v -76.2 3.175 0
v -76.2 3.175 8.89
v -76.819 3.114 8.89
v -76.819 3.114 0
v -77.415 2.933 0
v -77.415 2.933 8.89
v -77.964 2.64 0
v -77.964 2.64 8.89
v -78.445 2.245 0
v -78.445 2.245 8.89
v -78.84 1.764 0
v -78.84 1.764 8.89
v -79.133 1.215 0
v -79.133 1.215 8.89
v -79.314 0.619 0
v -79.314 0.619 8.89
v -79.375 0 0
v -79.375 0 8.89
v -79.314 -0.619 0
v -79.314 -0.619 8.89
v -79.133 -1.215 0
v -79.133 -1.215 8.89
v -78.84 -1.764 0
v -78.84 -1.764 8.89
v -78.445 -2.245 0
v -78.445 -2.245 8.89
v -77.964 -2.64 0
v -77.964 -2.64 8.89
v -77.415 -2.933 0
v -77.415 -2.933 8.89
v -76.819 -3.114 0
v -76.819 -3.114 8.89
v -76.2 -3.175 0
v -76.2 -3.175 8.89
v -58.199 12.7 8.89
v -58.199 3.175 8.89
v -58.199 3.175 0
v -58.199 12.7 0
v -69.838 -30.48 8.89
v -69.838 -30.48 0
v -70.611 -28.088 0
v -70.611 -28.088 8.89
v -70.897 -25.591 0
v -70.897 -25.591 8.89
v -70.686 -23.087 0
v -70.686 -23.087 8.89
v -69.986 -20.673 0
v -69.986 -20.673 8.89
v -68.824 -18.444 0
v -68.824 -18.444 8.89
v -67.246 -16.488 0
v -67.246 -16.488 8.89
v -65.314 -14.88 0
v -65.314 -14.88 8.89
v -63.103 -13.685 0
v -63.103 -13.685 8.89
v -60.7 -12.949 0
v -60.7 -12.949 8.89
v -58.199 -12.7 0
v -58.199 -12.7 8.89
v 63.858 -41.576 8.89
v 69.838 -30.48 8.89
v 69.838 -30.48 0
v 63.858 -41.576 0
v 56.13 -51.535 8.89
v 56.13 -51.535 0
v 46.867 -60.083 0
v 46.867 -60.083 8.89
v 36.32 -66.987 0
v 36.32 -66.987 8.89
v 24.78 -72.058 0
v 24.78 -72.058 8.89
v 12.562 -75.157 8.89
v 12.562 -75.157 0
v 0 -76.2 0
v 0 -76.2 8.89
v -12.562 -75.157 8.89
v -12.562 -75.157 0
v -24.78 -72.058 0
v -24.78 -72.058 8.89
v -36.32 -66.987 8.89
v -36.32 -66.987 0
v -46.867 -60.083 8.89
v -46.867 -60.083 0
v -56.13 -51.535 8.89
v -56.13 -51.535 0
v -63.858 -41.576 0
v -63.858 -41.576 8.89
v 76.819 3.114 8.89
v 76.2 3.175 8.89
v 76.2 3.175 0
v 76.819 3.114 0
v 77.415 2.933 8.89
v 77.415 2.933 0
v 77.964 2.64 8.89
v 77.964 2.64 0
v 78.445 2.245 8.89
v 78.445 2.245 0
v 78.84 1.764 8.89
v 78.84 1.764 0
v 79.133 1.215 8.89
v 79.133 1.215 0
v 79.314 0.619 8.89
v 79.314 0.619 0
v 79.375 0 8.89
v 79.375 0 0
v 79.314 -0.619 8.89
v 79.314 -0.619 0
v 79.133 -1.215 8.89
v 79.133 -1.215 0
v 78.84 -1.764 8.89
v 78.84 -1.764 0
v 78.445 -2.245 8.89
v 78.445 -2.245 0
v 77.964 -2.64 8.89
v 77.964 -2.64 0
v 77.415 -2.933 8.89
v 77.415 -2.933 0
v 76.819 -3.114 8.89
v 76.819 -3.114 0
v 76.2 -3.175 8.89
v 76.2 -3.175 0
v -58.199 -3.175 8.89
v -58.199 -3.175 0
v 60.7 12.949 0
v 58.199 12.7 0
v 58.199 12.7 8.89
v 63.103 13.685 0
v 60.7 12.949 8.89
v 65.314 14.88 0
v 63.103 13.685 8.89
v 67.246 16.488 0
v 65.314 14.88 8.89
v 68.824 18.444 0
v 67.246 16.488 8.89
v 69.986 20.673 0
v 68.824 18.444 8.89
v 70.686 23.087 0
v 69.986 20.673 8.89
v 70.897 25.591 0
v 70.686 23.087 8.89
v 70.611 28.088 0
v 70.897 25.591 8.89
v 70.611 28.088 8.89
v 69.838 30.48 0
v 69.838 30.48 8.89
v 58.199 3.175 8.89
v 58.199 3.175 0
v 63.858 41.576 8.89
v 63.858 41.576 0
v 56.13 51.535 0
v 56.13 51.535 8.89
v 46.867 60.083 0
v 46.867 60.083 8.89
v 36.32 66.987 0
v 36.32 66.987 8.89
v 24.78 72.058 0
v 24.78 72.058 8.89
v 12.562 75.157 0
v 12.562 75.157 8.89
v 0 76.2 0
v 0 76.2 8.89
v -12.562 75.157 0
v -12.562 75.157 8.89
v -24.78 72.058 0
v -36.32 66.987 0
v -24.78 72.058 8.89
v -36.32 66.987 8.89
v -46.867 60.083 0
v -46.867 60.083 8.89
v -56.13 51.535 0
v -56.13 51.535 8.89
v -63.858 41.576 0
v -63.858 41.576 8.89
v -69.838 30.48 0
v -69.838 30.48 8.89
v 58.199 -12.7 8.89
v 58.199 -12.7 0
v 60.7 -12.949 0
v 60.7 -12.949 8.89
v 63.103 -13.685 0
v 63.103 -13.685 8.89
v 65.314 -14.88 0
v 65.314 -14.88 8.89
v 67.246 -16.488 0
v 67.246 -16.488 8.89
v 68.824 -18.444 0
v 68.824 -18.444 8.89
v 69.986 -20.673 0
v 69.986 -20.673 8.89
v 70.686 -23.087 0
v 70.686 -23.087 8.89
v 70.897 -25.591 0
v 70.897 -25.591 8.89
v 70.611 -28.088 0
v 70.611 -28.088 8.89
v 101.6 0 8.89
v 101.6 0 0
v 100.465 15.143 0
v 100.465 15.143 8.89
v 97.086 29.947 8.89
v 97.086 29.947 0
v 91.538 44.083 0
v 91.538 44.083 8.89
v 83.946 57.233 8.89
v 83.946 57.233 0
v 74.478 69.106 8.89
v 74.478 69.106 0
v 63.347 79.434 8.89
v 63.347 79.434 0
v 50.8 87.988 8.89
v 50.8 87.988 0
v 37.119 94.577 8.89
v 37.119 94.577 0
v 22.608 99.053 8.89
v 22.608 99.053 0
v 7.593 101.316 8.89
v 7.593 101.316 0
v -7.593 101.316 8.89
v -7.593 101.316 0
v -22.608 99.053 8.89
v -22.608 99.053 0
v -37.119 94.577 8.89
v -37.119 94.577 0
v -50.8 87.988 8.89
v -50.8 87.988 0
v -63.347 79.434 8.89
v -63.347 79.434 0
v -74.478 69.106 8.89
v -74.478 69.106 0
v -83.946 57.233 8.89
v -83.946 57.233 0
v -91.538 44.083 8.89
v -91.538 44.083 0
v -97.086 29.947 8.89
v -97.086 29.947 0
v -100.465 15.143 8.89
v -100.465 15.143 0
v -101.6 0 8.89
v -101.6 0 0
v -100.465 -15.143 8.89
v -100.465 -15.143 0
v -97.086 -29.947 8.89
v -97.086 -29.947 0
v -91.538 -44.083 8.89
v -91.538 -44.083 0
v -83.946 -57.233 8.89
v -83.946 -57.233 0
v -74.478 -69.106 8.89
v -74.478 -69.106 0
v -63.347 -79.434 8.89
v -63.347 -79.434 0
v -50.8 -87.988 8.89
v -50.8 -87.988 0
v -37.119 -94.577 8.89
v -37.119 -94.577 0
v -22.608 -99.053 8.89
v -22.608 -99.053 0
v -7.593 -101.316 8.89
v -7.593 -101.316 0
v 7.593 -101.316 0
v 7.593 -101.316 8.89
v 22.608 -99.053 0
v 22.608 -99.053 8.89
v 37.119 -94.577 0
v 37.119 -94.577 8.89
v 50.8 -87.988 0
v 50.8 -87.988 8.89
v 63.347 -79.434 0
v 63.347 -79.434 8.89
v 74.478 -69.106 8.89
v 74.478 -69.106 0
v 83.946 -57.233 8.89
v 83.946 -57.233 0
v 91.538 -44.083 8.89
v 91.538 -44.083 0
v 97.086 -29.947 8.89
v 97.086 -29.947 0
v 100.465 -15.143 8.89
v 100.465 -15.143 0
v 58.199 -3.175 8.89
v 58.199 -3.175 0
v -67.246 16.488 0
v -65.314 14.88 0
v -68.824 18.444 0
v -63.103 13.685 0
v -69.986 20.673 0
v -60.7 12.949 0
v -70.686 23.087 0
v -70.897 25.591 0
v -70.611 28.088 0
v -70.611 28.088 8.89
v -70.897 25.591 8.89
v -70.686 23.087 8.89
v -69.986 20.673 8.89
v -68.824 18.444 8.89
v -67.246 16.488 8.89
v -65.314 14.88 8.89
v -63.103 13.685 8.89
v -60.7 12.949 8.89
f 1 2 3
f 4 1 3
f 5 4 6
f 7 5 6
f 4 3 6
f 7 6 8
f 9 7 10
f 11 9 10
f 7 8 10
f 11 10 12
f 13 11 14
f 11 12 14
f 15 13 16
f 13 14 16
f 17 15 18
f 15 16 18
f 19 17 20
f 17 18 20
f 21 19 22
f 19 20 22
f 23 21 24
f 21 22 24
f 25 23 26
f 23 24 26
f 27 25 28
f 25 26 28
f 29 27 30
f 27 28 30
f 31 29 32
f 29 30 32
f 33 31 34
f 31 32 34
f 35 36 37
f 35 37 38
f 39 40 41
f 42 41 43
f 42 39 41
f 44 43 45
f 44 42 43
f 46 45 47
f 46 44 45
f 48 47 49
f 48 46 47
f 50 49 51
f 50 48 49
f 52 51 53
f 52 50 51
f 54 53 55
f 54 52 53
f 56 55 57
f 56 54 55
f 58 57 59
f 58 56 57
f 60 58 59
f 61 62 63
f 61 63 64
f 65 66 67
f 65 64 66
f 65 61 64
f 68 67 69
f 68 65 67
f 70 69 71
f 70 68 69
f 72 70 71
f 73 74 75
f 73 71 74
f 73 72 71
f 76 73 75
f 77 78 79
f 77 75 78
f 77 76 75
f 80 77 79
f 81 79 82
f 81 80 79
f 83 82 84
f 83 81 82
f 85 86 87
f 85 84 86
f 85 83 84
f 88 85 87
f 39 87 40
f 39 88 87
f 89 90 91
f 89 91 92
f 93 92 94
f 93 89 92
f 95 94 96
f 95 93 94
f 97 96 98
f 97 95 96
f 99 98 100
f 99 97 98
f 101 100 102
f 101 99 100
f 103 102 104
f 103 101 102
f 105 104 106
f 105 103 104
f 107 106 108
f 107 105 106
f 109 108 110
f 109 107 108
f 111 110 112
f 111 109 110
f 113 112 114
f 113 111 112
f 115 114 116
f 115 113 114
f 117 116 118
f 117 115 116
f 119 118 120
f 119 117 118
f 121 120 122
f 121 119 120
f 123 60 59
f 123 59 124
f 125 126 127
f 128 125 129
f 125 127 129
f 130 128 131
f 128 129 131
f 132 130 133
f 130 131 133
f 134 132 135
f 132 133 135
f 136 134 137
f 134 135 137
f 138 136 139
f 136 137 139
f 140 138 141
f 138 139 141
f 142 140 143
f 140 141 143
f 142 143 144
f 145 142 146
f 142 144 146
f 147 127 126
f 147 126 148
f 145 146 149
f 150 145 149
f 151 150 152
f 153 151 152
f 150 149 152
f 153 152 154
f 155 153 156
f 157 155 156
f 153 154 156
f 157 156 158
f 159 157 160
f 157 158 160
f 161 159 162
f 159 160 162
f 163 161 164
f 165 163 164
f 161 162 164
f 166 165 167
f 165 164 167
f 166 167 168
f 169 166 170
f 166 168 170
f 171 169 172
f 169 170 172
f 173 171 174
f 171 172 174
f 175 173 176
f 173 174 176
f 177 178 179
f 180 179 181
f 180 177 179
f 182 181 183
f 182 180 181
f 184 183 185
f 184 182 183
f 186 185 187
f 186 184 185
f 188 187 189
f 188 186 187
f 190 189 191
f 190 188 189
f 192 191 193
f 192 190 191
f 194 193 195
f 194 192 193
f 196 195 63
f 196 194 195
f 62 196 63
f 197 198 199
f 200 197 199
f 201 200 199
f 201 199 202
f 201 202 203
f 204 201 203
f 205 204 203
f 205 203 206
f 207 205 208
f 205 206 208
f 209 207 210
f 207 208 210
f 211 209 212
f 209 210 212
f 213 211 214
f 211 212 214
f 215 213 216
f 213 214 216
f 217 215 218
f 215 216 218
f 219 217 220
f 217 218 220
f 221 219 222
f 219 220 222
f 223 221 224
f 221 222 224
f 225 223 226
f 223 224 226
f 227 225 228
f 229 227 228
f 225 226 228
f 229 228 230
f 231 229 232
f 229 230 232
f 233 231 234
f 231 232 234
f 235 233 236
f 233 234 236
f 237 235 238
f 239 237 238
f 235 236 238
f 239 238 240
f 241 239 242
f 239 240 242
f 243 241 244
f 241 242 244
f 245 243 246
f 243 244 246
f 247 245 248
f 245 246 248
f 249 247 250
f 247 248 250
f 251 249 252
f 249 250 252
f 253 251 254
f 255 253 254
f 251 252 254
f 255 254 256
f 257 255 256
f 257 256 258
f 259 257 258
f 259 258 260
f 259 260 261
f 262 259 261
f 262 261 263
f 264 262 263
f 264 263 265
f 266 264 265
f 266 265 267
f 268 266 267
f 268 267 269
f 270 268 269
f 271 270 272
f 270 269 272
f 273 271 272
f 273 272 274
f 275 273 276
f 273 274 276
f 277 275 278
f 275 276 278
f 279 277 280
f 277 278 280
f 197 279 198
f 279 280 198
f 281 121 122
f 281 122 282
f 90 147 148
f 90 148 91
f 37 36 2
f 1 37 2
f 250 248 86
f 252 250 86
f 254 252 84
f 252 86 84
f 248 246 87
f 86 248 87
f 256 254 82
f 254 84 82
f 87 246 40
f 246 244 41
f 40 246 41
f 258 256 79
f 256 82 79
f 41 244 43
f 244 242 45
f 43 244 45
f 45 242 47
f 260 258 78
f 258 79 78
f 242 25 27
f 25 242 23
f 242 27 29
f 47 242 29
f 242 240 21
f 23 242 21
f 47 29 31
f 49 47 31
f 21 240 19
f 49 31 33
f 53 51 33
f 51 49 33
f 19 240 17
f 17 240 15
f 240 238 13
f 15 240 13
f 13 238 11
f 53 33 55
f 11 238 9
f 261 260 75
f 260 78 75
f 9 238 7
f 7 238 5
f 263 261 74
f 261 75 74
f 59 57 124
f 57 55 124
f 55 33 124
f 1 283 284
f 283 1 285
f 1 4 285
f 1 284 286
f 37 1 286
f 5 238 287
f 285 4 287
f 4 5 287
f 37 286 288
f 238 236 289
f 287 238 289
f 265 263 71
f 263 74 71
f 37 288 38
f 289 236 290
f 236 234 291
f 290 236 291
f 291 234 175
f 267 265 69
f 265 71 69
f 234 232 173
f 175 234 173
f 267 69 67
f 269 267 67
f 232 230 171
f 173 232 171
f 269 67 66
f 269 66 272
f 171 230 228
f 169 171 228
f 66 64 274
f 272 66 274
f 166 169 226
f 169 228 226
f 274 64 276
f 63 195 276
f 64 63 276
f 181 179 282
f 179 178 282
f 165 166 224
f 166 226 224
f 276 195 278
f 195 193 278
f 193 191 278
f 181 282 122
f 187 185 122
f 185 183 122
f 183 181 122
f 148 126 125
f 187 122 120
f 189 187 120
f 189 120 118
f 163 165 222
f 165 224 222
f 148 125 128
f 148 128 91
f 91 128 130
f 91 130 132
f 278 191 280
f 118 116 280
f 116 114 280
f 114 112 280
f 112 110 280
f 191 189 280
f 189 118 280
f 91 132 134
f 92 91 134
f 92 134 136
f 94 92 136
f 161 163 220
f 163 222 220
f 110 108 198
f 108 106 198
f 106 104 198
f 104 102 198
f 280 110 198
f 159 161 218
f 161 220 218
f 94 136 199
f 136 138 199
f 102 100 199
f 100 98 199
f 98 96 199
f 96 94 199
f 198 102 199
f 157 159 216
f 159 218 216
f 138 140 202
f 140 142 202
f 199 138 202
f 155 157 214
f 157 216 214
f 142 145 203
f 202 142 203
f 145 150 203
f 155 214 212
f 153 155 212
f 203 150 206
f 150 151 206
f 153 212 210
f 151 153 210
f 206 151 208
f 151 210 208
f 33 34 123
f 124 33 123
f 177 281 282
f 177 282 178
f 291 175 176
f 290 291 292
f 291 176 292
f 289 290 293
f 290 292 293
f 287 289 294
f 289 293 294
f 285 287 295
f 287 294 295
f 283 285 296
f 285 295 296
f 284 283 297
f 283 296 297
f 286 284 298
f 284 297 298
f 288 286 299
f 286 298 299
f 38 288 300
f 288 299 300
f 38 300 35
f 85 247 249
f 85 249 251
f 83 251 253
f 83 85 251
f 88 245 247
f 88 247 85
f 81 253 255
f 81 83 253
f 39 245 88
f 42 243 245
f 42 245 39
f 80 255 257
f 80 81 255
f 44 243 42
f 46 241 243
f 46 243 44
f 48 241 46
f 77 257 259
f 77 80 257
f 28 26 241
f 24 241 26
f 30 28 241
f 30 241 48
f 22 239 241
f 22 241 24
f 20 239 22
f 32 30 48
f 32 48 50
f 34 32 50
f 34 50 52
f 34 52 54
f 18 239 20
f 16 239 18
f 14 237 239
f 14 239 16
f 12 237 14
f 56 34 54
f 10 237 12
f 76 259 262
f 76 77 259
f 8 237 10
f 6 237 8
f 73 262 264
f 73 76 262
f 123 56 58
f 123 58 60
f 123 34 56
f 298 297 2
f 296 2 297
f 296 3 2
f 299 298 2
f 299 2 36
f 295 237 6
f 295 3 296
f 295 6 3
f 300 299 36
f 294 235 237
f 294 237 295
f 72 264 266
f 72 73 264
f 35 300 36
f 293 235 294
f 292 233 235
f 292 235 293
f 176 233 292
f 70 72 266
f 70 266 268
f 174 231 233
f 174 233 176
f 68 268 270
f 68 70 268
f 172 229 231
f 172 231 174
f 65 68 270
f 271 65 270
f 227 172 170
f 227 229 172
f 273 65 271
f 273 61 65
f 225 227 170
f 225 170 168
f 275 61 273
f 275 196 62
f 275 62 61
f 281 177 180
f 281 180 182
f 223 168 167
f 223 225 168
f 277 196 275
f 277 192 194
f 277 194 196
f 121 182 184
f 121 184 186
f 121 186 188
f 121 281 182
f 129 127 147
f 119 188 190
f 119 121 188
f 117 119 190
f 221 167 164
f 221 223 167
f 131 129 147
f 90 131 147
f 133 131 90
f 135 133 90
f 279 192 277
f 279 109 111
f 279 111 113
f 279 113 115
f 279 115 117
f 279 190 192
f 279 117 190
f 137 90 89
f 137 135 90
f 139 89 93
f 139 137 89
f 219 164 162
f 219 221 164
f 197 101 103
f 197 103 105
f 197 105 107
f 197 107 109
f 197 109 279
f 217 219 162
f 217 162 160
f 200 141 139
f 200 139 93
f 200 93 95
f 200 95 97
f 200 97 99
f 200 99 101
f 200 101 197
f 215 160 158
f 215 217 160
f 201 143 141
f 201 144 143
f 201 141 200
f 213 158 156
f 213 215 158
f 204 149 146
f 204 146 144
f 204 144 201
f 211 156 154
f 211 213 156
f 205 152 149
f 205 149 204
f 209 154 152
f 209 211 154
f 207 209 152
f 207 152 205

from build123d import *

# Parameters (mm, degrees)
SKETCH1_R           = 101.6
BOSS_EXTRUDE1_DEPTH = 8.89
SKETCH2_R           = 25.4
CUT_EXTRUDE1_DEPTH  = 144.95885558
CUT_EXTRUDE2_DEPTH  = 144.95885558
CUT_EXTRUDE3_DEPTH  = 144.95885558
CUT_EXTRUDE10_DEPTH = 144.95885558


with BuildPart() as part:
    # Sketch1 → Boss-Extrude1 (new body)
    with BuildSketch(Plane.XY):
        Circle(SKETCH1_R)
    extrude(amount=BOSS_EXTRUDE1_DEPTH)

    # Sketch2 → Cut-Extrude1 (cut, through all)
    with BuildSketch(Plane.XY.offset(8.89)):
        Circle(SKETCH2_R)
    extrude(amount=-CUT_EXTRUDE1_DEPTH, mode=Mode.SUBTRACT)

    # Sketch3 → Cut-Extrude2 (cut, through all)
    with BuildSketch(Plane.XY.offset(8.89)):
        with BuildLine():
            ThreePointArc((69.838453591, 30.48), (0, 76.2), (-69.838453591, 30.48))
            ThreePointArc((-69.838453591, 30.48), (-63.278711326, 13.760257735), (-46.558969061, 20.32))
            ThreePointArc((-46.558969061, 20.32), (0, 50.8), (46.558969061, 20.32))
            ThreePointArc((46.558969061, 20.32), (63.278711326, 13.760257735), (69.838453591, 30.48))
        make_face()
    cut_extrude2 = extrude(amount=-CUT_EXTRUDE2_DEPTH, mode=Mode.SUBTRACT)

    # Mirror1: Cut-Extrude2 across plane
    add(cut_extrude2.mirror(Plane.ZX), mode=Mode.SUBTRACT)

    # Sketch4 → Cut-Extrude3 (cut, through all)
    with BuildSketch(Plane.XY.offset(8.89)):
        with BuildLine():
            Line((76.2, -3.175), (25.4, -3.175))
            ThreePointArc((25.4, -3.175), (22.225, 0), (25.4, 3.175))
            Line((25.4, 3.175), (76.2, 3.175))
            ThreePointArc((76.2, 3.175), (79.375, 0), (76.2, -3.175))
        make_face()
        with BuildLine():
            Line((-76.2, -3.175), (-25.4, -3.175))
            ThreePointArc((-25.4, -3.175), (-22.225, 0), (-25.4, 3.175))
            Line((-25.4, 3.175), (-76.2, 3.175))
            ThreePointArc((-76.2, 3.175), (-79.375, 0), (-76.2, -3.175))
        make_face()
    extrude(amount=-CUT_EXTRUDE3_DEPTH, mode=Mode.SUBTRACT)

    # Sketch14 → Cut-Extrude10 (cut, through all)
    with BuildSketch(Plane.XY.offset(8.89)):
        with BuildLine():
            Line((-58.198711326, -12.7), (-58.198711326, 12.7))
            ThreePointArc((-58.198711326, 12.7), (-51.242634846, 14.774417663), (-46.558969061, 20.32))
            ThreePointArc((-46.558969061, 20.32), (0, 50.8), (46.558969061, 20.32))
            ThreePointArc((46.558969061, 20.32), (51.242634846, 14.774417663), (58.198711326, 12.7))
            Line((58.198711326, 12.7), (58.198711326, -12.7))
            ThreePointArc((58.198711326, -12.7), (51.242634846, -14.774417663), (46.558969061, -20.32))
            ThreePointArc((46.558969061, -20.32), (0, -50.8), (-46.558969061, -20.32))
            ThreePointArc((-46.558969061, -20.32), (-51.242634846, -14.774417663), (-58.198711326, -12.7))
        make_face()
    extrude(amount=-CUT_EXTRUDE10_DEPTH, mode=Mode.SUBTRACT)


solid = part.part
